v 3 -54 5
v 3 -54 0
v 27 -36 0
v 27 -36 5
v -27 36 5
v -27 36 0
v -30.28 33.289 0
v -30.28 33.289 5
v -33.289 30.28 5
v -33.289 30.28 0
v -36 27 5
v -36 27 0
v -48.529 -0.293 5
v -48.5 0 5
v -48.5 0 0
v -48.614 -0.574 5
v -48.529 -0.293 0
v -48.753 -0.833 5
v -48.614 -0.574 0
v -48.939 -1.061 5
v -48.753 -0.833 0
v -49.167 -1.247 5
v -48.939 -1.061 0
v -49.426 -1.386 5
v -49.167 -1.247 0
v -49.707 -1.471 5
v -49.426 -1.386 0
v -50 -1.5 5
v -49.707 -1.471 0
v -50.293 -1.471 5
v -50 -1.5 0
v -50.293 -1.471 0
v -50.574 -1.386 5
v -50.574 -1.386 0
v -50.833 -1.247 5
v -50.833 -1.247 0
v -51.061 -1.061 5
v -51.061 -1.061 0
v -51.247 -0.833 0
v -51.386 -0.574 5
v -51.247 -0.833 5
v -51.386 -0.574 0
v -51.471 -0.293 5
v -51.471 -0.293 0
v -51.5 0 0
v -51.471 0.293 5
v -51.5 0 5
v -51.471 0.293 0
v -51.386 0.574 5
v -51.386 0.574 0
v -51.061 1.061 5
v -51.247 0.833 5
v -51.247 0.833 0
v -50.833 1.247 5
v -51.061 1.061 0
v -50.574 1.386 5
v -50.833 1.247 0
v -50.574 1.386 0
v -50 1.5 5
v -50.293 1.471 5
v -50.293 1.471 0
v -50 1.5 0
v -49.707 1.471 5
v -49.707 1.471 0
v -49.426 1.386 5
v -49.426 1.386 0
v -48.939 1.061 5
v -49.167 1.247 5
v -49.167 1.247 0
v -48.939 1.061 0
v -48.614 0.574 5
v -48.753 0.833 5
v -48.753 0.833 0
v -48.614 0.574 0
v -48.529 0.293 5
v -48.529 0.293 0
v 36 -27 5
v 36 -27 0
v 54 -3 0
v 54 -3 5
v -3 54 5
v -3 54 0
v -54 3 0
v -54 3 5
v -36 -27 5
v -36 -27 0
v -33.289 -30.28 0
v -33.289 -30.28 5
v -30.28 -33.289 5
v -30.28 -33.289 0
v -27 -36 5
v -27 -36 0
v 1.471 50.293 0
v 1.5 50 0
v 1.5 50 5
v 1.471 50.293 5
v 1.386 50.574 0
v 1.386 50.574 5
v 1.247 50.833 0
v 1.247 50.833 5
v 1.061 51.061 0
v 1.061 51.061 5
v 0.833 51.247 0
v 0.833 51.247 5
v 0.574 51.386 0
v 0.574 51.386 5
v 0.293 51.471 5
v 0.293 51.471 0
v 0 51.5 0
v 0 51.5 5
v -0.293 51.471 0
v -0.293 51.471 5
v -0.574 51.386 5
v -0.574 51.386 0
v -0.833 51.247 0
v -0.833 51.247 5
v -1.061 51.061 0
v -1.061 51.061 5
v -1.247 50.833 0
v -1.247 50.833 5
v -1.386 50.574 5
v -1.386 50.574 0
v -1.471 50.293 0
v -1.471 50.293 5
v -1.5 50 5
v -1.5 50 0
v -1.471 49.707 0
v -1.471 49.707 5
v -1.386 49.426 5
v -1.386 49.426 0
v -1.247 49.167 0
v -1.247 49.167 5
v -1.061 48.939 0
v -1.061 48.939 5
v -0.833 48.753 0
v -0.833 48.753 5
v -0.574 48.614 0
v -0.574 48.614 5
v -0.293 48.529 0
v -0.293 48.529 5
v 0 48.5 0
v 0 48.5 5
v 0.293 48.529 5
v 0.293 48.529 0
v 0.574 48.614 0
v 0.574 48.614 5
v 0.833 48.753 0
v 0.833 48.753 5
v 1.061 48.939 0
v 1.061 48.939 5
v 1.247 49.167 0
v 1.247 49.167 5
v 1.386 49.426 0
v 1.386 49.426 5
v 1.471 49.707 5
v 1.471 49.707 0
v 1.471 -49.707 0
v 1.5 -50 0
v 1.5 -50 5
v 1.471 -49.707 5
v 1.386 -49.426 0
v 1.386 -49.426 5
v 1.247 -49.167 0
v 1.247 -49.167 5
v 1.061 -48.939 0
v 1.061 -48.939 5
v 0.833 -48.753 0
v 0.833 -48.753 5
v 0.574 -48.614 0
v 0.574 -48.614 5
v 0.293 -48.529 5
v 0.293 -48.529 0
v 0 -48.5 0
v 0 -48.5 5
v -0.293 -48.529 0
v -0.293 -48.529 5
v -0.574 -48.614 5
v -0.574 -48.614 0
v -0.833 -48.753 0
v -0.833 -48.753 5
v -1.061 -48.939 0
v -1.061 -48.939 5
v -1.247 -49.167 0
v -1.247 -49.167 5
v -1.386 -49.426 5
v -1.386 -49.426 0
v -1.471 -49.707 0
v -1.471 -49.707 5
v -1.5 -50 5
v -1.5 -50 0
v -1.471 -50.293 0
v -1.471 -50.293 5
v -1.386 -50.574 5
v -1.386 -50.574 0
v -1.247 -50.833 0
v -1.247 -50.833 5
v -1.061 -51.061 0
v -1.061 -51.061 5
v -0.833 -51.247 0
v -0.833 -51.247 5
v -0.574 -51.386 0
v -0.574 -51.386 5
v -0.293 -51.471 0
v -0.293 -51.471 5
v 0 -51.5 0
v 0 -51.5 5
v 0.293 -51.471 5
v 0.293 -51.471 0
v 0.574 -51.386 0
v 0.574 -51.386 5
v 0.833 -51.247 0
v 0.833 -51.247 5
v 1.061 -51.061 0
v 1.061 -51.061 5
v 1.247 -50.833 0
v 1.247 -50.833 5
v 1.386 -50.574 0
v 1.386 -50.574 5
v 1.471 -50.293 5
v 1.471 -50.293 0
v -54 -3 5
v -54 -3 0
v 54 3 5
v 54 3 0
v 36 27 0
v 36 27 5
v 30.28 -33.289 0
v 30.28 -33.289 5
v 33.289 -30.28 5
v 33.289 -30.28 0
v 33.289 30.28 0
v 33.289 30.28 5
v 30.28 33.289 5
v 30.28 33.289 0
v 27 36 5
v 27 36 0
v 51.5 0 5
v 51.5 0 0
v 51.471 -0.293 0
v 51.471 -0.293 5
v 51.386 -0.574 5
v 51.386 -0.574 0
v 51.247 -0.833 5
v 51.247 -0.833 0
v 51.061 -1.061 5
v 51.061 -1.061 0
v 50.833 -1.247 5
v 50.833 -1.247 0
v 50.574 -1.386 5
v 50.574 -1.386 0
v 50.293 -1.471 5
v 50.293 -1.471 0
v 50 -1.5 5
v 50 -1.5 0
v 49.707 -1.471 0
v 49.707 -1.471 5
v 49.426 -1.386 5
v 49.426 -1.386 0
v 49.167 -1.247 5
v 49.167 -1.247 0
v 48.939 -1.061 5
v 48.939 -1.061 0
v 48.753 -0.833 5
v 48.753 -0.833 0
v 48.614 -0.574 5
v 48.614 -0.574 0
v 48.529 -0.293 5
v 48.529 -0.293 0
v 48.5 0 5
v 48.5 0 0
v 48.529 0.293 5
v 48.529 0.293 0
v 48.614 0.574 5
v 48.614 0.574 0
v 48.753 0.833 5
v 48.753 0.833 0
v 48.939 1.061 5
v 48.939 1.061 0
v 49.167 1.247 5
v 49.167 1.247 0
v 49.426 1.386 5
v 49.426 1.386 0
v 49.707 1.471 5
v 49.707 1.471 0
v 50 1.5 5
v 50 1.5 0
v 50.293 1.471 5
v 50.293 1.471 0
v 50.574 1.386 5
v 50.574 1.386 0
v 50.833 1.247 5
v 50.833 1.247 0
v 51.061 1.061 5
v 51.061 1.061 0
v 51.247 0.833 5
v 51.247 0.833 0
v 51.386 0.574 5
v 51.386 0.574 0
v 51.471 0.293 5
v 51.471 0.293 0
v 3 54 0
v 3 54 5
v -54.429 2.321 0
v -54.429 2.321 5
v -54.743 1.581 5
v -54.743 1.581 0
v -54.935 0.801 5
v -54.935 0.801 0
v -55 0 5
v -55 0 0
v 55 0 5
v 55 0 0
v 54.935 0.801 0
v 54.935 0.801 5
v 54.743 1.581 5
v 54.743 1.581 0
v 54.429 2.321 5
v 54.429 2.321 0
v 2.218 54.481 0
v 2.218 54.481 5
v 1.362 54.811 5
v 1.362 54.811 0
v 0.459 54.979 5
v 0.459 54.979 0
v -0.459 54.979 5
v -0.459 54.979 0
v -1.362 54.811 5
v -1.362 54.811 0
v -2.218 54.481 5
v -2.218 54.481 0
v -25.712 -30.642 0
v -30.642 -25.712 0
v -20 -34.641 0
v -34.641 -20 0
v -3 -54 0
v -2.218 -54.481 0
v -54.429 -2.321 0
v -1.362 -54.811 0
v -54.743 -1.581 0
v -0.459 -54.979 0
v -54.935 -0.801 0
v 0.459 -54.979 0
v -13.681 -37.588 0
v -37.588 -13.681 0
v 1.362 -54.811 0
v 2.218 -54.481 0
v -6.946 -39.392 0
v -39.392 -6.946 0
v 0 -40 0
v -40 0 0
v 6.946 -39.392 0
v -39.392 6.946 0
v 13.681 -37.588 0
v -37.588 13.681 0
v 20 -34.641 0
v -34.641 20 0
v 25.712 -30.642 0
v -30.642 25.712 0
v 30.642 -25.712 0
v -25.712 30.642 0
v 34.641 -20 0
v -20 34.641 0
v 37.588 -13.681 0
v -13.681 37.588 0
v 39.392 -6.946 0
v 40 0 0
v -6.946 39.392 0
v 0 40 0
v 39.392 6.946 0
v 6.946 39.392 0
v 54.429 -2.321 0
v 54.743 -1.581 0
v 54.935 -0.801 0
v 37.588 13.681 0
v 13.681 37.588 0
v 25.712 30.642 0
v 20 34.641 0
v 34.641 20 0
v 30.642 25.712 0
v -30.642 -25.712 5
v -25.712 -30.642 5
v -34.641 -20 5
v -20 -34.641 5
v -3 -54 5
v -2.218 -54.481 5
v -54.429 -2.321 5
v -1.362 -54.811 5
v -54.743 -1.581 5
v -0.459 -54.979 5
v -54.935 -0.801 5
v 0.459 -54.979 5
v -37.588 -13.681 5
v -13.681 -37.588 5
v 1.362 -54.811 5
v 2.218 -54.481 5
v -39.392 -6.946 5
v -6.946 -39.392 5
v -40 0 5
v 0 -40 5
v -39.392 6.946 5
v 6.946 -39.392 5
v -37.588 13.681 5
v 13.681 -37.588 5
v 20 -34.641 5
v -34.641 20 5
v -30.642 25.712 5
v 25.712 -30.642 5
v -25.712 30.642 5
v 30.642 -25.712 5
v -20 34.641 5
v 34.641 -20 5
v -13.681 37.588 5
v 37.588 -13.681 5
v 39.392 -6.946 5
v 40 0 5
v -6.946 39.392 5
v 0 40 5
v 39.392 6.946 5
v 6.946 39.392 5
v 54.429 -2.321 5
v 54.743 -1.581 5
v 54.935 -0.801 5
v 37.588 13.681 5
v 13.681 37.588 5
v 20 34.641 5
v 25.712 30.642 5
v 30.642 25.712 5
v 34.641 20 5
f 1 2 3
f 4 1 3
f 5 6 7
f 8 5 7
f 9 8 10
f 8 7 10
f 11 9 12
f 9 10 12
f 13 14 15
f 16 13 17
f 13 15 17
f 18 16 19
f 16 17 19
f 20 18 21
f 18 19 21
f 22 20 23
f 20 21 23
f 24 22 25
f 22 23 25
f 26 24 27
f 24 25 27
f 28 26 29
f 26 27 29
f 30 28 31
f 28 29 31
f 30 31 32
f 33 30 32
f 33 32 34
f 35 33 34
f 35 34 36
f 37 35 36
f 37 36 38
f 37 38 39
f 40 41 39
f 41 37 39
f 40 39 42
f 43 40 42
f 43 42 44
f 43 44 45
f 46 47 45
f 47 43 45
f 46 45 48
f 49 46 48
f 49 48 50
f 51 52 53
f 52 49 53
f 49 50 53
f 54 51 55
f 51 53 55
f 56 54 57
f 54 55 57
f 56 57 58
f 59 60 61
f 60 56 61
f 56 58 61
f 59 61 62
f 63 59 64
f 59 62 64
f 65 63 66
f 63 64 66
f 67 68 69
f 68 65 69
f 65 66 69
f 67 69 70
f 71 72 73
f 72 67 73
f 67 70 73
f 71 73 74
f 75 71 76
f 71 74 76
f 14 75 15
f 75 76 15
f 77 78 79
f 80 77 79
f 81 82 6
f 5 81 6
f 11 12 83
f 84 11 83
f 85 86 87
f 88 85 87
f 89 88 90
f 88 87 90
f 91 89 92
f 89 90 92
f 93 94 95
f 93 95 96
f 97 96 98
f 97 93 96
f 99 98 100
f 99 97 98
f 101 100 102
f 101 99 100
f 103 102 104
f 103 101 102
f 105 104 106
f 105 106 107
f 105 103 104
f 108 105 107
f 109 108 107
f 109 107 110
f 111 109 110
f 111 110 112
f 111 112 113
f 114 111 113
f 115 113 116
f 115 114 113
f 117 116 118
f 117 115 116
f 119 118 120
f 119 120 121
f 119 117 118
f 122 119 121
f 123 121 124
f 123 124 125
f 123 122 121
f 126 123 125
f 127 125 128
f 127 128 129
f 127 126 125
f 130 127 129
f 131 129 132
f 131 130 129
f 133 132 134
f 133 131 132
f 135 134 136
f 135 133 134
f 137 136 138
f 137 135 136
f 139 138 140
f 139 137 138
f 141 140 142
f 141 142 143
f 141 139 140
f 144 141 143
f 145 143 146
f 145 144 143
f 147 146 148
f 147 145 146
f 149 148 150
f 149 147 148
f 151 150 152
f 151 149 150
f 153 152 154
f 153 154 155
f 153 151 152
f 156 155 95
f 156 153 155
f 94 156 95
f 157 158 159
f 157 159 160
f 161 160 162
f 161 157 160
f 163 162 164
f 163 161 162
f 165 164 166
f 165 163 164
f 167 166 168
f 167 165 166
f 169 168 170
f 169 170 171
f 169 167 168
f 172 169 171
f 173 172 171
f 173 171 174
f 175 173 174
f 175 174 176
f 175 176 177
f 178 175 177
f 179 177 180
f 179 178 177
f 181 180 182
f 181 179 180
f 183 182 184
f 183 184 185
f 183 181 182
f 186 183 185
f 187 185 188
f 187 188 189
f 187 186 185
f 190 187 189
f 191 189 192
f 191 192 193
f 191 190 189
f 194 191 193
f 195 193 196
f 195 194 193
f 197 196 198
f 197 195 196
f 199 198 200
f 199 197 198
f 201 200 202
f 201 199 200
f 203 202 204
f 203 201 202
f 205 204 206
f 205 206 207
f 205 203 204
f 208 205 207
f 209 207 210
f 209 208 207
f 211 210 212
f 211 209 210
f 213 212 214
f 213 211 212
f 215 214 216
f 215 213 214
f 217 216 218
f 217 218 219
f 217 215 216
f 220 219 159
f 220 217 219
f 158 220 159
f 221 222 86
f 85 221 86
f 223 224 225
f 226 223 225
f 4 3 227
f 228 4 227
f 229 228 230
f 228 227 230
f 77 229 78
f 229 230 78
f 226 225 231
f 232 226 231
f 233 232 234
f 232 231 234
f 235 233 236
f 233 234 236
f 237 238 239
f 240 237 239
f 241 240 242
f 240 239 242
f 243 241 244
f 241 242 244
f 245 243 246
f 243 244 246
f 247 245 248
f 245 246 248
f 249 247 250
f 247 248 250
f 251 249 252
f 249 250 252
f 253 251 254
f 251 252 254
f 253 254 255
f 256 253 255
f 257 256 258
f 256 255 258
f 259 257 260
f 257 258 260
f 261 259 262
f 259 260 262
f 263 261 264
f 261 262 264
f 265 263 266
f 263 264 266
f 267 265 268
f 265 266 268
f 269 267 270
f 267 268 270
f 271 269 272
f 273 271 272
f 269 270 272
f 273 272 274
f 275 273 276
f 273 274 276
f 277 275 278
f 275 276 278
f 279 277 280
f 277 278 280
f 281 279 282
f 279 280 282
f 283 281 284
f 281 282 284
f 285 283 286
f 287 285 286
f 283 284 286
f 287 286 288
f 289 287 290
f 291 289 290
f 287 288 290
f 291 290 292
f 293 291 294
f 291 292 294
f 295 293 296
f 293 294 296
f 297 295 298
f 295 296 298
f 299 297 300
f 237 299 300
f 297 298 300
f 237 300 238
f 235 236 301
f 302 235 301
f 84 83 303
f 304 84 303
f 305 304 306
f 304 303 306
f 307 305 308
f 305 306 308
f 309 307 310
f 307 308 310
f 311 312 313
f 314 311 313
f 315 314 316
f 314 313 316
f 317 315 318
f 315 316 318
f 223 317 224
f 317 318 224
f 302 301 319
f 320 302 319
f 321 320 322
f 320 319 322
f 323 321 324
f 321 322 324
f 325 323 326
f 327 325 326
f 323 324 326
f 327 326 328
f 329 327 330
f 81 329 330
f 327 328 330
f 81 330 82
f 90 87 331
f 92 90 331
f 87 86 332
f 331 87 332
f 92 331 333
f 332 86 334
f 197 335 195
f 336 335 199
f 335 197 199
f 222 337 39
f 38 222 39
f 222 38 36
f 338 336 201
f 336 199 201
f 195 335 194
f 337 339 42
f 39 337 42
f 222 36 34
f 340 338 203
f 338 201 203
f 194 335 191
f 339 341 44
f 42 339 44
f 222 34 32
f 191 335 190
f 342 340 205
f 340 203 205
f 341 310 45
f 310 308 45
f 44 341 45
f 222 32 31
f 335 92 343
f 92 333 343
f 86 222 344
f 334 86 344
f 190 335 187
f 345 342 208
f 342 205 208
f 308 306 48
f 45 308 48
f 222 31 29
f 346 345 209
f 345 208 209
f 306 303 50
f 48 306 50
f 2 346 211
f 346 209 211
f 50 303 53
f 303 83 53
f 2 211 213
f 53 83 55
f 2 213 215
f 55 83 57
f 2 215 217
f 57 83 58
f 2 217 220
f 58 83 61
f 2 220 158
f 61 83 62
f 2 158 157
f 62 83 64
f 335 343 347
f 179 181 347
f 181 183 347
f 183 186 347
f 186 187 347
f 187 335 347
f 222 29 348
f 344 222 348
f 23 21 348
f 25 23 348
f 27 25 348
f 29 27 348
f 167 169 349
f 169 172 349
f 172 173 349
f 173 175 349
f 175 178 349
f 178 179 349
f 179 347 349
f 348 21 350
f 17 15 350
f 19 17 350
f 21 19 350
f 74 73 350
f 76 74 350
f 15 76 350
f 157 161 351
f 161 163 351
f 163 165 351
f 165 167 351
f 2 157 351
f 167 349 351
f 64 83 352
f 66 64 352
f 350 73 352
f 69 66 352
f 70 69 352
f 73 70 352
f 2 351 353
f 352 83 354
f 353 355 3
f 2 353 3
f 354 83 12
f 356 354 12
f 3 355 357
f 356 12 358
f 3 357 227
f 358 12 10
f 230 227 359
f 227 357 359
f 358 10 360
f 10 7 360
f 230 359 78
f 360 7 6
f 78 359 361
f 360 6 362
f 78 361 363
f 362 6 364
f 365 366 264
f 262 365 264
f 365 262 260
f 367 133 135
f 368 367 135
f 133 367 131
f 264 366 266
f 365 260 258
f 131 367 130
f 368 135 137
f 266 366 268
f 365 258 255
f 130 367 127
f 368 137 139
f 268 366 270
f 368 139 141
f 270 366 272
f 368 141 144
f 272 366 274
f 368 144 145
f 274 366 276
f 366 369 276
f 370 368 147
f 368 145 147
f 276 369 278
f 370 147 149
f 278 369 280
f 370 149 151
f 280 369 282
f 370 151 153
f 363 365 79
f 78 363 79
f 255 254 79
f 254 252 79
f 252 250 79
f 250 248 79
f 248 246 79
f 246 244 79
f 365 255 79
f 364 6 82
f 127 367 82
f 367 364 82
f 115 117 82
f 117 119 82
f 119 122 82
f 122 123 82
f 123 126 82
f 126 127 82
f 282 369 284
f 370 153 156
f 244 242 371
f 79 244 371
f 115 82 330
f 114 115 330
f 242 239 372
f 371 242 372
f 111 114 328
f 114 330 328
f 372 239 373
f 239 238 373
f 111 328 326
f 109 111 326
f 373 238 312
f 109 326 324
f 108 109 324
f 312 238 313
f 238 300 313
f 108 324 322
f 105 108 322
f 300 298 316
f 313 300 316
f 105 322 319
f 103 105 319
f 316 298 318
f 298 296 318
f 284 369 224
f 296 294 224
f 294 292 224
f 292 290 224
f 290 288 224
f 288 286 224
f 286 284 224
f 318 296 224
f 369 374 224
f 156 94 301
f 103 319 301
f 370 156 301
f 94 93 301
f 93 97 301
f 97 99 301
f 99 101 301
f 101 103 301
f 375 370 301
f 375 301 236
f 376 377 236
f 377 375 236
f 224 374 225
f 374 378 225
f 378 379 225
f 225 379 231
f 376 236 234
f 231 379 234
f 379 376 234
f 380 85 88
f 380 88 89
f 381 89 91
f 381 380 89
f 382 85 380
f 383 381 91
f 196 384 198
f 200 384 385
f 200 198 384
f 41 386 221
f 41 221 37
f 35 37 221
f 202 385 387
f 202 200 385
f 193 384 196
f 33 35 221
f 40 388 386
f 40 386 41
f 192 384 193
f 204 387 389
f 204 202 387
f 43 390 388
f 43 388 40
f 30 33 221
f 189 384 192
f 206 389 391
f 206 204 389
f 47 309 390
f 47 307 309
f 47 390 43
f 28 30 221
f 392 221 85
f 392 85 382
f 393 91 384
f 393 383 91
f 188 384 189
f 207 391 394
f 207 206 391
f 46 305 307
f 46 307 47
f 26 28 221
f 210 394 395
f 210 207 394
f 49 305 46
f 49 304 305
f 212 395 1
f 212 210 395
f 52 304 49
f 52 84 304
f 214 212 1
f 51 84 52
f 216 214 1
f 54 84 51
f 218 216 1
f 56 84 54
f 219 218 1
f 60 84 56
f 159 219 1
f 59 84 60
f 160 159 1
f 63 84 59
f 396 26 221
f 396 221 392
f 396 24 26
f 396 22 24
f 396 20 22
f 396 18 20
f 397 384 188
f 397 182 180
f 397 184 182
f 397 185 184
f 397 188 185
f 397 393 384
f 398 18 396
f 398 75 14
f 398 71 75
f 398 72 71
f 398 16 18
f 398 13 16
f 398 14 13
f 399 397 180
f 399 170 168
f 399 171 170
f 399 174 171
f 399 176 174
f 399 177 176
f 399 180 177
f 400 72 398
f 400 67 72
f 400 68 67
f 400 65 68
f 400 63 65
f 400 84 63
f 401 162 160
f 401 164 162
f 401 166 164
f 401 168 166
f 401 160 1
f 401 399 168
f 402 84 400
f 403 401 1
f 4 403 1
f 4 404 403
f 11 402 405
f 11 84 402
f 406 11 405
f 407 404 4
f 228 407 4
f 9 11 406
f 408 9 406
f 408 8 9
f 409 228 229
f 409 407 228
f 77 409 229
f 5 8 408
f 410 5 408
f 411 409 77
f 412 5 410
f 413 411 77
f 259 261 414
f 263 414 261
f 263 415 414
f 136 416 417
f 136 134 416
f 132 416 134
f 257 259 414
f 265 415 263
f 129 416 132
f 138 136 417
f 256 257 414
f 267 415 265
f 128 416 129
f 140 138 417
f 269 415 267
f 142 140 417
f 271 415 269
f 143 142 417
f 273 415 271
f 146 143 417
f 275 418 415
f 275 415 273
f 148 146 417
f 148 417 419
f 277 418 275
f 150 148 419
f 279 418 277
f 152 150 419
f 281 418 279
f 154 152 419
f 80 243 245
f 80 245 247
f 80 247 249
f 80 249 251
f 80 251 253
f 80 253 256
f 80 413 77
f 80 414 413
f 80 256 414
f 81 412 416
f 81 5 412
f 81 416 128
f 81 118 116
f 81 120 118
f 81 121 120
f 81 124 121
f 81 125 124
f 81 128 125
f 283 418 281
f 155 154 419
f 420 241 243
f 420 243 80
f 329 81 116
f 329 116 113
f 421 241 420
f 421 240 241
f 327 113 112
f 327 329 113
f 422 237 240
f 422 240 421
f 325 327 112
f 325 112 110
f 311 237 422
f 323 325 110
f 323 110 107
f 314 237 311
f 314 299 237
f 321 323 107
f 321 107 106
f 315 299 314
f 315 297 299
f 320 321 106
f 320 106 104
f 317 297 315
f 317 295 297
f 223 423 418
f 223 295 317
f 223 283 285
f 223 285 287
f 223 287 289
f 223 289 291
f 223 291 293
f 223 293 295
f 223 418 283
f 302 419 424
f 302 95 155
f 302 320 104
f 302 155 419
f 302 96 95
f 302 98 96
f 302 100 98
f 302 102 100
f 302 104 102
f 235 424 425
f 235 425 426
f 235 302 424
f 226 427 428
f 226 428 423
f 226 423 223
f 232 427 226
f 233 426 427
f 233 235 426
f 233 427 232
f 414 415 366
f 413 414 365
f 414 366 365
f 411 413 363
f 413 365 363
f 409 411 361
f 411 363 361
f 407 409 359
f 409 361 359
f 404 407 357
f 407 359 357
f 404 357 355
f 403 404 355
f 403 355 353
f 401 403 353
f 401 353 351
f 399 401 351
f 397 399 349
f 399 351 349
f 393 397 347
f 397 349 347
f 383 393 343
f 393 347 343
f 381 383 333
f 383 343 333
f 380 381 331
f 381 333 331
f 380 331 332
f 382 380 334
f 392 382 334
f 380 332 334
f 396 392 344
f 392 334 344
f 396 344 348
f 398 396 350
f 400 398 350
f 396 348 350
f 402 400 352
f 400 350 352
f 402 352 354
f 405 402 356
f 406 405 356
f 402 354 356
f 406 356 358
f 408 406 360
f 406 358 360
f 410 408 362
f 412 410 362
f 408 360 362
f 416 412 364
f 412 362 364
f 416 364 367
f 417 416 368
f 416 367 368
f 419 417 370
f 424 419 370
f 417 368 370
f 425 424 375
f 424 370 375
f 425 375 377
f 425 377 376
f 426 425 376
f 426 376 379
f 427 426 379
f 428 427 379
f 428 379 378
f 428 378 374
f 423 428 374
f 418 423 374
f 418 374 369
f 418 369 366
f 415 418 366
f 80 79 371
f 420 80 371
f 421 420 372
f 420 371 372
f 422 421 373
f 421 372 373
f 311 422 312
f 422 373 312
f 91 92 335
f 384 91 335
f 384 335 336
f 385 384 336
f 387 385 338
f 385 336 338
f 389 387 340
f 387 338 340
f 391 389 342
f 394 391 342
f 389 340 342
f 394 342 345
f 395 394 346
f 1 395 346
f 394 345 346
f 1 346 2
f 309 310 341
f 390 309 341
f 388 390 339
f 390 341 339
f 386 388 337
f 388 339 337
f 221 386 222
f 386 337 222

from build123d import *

# Parameters (mm, degrees)
ESQUISSE1_R        = 1.5
BOSS_EXTRU_2_DEPTH = 5


with BuildPart() as part:
    # Esquisse1 → Boss.-Extru.2 (new body)
    # profile 1 of 10: a face of its own
    with BuildSketch(Plane.XY):
        with BuildLine():
            ThreePointArc((-40, 0), (0, 40), (40, 0))
            Line((40, 0), (45, 0))
            ThreePointArc((45, 0), (42.690748412, 14.230249471), (36, 27))
            ThreePointArc((36, 27), (31.819805153, 31.819805153), (27, 36))
            ThreePointArc((27, 36), (0, 45), (-27, 36))
            ThreePointArc((-27, 36), (-31.819805153, 31.819805153), (-36, 27))
            ThreePointArc((-36, 27), (-42.690748412, 14.230249471), (-45, 0))
            Line((-45, 0), (-40, 0))
        make_face()
    # profile 2 of 10: a face of its own
    with BuildSketch(Plane.XY):
        with BuildLine():
            Line((45, 0), (40, 0))
            ThreePointArc((40, 0), (0, -40), (-40, 0))
            Line((-40, 0), (-45, 0))
            ThreePointArc((-45, 0), (-42.690748412, -14.230249471), (-36, -27))
            ThreePointArc((-36, -27), (-31.819805153, -31.819805153), (-27, -36))
            ThreePointArc((-27, -36), (0, -45), (27, -36))
            ThreePointArc((27, -36), (31.819805153, -31.819805153), (36, -27))
            ThreePointArc((36, -27), (42.690748412, -14.230249471), (45, 0))
        make_face()
    # profile 3 of 10: a face of its own
    with BuildSketch(Plane.XY):
        with BuildLine():
            ThreePointArc((-40, 0), (0, 40), (40, 0))
            Line((40, 0), (45, 0))
            ThreePointArc((45, 0), (42.690748412, 14.230249471), (36, 27))
            ThreePointArc((36, 27), (31.819805153, 31.819805153), (27, 36))
            ThreePointArc((27, 36), (0, 45), (-27, 36))
            ThreePointArc((-27, 36), (-31.819805153, 31.819805153), (-36, 27))
            ThreePointArc((-36, 27), (-42.690748412, 14.230249471), (-45, 0))
            Line((-45, 0), (-40, 0))
        make_face()
    # profile 4 of 10: a face of its own
    with BuildSketch(Plane.XY):
        with BuildLine():
            Line((45, 0), (40, 0))
            ThreePointArc((40, 0), (0, -40), (-40, 0))
            Line((-40, 0), (-45, 0))
            ThreePointArc((-45, 0), (-42.690748412, -14.230249471), (-36, -27))
            ThreePointArc((-36, -27), (-31.819805153, -31.819805153), (-27, -36))
            ThreePointArc((-27, -36), (0, -45), (27, -36))
            ThreePointArc((27, -36), (31.819805153, -31.819805153), (36, -27))
            ThreePointArc((36, -27), (42.690748412, -14.230249471), (45, 0))
        make_face()
    # profile 5 of 10: a face of its own
    with BuildSketch(Plane.XY):
        with BuildLine():
            ThreePointArc((-27, 36), (0, 45), (27, 36))
            Line((27, 36), (3, 54))
            ThreePointArc((3, 54), (0, 55), (-3, 54))
            Line((-3, 54), (-27, 36))
        make_face()
        with Locations((0, 50)):
            Circle(ESQUISSE1_R, mode=Mode.SUBTRACT)
    # profile 6 of 10: a face of its own
    with BuildSketch(Plane.XY):
        with BuildLine():
            Line((48.5, 0), (45, 0))
            ThreePointArc((45, 0), (42.690748412, -14.230249471), (36, -27))
            Line((36, -27), (54, -3))
            ThreePointArc((54, -3), (54.74341649, -1.58113883), (55, 0))
            Line((55, 0), (51.5, 0))
            ThreePointArc((51.5, 0), (50, -1.5), (48.5, 0))
        make_face()
    # profile 7 of 10: a face of its own
    with BuildSketch(Plane.XY):
        with BuildLine():
            ThreePointArc((36, 27), (42.690748412, 14.230249471), (45, 0))
            Line((45, 0), (48.5, 0))
            ThreePointArc((48.5, 0), (50, 1.5), (51.5, 0))
            Line((51.5, 0), (55, 0))
            ThreePointArc((55, 0), (54.74341649, 1.58113883), (54, 3))
            Line((54, 3), (36, 27))
        make_face()
    # profile 8 of 10: a face of its own
    with BuildSketch(Plane.XY):
        with BuildLine():
            Line((3, -54), (27, -36))
            ThreePointArc((27, -36), (0, -45), (-27, -36))
            Line((-27, -36), (-3, -54))
            ThreePointArc((-3, -54), (0, -55), (3, -54))
        make_face()
        with Locations((0, -50)):
            Circle(ESQUISSE1_R, mode=Mode.SUBTRACT)
    # profile 9 of 10: a face of its own
    with BuildSketch(Plane.XY):
        with BuildLine():
            Line((-48.5, 0), (-45, 0))
            ThreePointArc((-45, 0), (-42.690748412, 14.230249471), (-36, 27))
            Line((-36, 27), (-54, 3))
            ThreePointArc((-54, 3), (-54.74341649, 1.58113883), (-55, 0))
            Line((-55, 0), (-51.5, 0))
            ThreePointArc((-51.5, 0), (-50, 1.5), (-48.5, 0))
        make_face()
    # profile 10 of 10: a face of its own
    with BuildSketch(Plane.XY):
        with BuildLine():
            ThreePointArc((-36, -27), (-42.690748412, -14.230249471), (-45, 0))
            Line((-45, 0), (-48.5, 0))
            ThreePointArc((-48.5, 0), (-50, -1.5), (-51.5, 0))
            Line((-51.5, 0), (-55, 0))
            ThreePointArc((-55, 0), (-54.74341649, -1.58113883), (-54, -3))
            Line((-54, -3), (-36, -27))
        make_face()
    extrude(amount=BOSS_EXTRU_2_DEPTH)


solid = part.part
